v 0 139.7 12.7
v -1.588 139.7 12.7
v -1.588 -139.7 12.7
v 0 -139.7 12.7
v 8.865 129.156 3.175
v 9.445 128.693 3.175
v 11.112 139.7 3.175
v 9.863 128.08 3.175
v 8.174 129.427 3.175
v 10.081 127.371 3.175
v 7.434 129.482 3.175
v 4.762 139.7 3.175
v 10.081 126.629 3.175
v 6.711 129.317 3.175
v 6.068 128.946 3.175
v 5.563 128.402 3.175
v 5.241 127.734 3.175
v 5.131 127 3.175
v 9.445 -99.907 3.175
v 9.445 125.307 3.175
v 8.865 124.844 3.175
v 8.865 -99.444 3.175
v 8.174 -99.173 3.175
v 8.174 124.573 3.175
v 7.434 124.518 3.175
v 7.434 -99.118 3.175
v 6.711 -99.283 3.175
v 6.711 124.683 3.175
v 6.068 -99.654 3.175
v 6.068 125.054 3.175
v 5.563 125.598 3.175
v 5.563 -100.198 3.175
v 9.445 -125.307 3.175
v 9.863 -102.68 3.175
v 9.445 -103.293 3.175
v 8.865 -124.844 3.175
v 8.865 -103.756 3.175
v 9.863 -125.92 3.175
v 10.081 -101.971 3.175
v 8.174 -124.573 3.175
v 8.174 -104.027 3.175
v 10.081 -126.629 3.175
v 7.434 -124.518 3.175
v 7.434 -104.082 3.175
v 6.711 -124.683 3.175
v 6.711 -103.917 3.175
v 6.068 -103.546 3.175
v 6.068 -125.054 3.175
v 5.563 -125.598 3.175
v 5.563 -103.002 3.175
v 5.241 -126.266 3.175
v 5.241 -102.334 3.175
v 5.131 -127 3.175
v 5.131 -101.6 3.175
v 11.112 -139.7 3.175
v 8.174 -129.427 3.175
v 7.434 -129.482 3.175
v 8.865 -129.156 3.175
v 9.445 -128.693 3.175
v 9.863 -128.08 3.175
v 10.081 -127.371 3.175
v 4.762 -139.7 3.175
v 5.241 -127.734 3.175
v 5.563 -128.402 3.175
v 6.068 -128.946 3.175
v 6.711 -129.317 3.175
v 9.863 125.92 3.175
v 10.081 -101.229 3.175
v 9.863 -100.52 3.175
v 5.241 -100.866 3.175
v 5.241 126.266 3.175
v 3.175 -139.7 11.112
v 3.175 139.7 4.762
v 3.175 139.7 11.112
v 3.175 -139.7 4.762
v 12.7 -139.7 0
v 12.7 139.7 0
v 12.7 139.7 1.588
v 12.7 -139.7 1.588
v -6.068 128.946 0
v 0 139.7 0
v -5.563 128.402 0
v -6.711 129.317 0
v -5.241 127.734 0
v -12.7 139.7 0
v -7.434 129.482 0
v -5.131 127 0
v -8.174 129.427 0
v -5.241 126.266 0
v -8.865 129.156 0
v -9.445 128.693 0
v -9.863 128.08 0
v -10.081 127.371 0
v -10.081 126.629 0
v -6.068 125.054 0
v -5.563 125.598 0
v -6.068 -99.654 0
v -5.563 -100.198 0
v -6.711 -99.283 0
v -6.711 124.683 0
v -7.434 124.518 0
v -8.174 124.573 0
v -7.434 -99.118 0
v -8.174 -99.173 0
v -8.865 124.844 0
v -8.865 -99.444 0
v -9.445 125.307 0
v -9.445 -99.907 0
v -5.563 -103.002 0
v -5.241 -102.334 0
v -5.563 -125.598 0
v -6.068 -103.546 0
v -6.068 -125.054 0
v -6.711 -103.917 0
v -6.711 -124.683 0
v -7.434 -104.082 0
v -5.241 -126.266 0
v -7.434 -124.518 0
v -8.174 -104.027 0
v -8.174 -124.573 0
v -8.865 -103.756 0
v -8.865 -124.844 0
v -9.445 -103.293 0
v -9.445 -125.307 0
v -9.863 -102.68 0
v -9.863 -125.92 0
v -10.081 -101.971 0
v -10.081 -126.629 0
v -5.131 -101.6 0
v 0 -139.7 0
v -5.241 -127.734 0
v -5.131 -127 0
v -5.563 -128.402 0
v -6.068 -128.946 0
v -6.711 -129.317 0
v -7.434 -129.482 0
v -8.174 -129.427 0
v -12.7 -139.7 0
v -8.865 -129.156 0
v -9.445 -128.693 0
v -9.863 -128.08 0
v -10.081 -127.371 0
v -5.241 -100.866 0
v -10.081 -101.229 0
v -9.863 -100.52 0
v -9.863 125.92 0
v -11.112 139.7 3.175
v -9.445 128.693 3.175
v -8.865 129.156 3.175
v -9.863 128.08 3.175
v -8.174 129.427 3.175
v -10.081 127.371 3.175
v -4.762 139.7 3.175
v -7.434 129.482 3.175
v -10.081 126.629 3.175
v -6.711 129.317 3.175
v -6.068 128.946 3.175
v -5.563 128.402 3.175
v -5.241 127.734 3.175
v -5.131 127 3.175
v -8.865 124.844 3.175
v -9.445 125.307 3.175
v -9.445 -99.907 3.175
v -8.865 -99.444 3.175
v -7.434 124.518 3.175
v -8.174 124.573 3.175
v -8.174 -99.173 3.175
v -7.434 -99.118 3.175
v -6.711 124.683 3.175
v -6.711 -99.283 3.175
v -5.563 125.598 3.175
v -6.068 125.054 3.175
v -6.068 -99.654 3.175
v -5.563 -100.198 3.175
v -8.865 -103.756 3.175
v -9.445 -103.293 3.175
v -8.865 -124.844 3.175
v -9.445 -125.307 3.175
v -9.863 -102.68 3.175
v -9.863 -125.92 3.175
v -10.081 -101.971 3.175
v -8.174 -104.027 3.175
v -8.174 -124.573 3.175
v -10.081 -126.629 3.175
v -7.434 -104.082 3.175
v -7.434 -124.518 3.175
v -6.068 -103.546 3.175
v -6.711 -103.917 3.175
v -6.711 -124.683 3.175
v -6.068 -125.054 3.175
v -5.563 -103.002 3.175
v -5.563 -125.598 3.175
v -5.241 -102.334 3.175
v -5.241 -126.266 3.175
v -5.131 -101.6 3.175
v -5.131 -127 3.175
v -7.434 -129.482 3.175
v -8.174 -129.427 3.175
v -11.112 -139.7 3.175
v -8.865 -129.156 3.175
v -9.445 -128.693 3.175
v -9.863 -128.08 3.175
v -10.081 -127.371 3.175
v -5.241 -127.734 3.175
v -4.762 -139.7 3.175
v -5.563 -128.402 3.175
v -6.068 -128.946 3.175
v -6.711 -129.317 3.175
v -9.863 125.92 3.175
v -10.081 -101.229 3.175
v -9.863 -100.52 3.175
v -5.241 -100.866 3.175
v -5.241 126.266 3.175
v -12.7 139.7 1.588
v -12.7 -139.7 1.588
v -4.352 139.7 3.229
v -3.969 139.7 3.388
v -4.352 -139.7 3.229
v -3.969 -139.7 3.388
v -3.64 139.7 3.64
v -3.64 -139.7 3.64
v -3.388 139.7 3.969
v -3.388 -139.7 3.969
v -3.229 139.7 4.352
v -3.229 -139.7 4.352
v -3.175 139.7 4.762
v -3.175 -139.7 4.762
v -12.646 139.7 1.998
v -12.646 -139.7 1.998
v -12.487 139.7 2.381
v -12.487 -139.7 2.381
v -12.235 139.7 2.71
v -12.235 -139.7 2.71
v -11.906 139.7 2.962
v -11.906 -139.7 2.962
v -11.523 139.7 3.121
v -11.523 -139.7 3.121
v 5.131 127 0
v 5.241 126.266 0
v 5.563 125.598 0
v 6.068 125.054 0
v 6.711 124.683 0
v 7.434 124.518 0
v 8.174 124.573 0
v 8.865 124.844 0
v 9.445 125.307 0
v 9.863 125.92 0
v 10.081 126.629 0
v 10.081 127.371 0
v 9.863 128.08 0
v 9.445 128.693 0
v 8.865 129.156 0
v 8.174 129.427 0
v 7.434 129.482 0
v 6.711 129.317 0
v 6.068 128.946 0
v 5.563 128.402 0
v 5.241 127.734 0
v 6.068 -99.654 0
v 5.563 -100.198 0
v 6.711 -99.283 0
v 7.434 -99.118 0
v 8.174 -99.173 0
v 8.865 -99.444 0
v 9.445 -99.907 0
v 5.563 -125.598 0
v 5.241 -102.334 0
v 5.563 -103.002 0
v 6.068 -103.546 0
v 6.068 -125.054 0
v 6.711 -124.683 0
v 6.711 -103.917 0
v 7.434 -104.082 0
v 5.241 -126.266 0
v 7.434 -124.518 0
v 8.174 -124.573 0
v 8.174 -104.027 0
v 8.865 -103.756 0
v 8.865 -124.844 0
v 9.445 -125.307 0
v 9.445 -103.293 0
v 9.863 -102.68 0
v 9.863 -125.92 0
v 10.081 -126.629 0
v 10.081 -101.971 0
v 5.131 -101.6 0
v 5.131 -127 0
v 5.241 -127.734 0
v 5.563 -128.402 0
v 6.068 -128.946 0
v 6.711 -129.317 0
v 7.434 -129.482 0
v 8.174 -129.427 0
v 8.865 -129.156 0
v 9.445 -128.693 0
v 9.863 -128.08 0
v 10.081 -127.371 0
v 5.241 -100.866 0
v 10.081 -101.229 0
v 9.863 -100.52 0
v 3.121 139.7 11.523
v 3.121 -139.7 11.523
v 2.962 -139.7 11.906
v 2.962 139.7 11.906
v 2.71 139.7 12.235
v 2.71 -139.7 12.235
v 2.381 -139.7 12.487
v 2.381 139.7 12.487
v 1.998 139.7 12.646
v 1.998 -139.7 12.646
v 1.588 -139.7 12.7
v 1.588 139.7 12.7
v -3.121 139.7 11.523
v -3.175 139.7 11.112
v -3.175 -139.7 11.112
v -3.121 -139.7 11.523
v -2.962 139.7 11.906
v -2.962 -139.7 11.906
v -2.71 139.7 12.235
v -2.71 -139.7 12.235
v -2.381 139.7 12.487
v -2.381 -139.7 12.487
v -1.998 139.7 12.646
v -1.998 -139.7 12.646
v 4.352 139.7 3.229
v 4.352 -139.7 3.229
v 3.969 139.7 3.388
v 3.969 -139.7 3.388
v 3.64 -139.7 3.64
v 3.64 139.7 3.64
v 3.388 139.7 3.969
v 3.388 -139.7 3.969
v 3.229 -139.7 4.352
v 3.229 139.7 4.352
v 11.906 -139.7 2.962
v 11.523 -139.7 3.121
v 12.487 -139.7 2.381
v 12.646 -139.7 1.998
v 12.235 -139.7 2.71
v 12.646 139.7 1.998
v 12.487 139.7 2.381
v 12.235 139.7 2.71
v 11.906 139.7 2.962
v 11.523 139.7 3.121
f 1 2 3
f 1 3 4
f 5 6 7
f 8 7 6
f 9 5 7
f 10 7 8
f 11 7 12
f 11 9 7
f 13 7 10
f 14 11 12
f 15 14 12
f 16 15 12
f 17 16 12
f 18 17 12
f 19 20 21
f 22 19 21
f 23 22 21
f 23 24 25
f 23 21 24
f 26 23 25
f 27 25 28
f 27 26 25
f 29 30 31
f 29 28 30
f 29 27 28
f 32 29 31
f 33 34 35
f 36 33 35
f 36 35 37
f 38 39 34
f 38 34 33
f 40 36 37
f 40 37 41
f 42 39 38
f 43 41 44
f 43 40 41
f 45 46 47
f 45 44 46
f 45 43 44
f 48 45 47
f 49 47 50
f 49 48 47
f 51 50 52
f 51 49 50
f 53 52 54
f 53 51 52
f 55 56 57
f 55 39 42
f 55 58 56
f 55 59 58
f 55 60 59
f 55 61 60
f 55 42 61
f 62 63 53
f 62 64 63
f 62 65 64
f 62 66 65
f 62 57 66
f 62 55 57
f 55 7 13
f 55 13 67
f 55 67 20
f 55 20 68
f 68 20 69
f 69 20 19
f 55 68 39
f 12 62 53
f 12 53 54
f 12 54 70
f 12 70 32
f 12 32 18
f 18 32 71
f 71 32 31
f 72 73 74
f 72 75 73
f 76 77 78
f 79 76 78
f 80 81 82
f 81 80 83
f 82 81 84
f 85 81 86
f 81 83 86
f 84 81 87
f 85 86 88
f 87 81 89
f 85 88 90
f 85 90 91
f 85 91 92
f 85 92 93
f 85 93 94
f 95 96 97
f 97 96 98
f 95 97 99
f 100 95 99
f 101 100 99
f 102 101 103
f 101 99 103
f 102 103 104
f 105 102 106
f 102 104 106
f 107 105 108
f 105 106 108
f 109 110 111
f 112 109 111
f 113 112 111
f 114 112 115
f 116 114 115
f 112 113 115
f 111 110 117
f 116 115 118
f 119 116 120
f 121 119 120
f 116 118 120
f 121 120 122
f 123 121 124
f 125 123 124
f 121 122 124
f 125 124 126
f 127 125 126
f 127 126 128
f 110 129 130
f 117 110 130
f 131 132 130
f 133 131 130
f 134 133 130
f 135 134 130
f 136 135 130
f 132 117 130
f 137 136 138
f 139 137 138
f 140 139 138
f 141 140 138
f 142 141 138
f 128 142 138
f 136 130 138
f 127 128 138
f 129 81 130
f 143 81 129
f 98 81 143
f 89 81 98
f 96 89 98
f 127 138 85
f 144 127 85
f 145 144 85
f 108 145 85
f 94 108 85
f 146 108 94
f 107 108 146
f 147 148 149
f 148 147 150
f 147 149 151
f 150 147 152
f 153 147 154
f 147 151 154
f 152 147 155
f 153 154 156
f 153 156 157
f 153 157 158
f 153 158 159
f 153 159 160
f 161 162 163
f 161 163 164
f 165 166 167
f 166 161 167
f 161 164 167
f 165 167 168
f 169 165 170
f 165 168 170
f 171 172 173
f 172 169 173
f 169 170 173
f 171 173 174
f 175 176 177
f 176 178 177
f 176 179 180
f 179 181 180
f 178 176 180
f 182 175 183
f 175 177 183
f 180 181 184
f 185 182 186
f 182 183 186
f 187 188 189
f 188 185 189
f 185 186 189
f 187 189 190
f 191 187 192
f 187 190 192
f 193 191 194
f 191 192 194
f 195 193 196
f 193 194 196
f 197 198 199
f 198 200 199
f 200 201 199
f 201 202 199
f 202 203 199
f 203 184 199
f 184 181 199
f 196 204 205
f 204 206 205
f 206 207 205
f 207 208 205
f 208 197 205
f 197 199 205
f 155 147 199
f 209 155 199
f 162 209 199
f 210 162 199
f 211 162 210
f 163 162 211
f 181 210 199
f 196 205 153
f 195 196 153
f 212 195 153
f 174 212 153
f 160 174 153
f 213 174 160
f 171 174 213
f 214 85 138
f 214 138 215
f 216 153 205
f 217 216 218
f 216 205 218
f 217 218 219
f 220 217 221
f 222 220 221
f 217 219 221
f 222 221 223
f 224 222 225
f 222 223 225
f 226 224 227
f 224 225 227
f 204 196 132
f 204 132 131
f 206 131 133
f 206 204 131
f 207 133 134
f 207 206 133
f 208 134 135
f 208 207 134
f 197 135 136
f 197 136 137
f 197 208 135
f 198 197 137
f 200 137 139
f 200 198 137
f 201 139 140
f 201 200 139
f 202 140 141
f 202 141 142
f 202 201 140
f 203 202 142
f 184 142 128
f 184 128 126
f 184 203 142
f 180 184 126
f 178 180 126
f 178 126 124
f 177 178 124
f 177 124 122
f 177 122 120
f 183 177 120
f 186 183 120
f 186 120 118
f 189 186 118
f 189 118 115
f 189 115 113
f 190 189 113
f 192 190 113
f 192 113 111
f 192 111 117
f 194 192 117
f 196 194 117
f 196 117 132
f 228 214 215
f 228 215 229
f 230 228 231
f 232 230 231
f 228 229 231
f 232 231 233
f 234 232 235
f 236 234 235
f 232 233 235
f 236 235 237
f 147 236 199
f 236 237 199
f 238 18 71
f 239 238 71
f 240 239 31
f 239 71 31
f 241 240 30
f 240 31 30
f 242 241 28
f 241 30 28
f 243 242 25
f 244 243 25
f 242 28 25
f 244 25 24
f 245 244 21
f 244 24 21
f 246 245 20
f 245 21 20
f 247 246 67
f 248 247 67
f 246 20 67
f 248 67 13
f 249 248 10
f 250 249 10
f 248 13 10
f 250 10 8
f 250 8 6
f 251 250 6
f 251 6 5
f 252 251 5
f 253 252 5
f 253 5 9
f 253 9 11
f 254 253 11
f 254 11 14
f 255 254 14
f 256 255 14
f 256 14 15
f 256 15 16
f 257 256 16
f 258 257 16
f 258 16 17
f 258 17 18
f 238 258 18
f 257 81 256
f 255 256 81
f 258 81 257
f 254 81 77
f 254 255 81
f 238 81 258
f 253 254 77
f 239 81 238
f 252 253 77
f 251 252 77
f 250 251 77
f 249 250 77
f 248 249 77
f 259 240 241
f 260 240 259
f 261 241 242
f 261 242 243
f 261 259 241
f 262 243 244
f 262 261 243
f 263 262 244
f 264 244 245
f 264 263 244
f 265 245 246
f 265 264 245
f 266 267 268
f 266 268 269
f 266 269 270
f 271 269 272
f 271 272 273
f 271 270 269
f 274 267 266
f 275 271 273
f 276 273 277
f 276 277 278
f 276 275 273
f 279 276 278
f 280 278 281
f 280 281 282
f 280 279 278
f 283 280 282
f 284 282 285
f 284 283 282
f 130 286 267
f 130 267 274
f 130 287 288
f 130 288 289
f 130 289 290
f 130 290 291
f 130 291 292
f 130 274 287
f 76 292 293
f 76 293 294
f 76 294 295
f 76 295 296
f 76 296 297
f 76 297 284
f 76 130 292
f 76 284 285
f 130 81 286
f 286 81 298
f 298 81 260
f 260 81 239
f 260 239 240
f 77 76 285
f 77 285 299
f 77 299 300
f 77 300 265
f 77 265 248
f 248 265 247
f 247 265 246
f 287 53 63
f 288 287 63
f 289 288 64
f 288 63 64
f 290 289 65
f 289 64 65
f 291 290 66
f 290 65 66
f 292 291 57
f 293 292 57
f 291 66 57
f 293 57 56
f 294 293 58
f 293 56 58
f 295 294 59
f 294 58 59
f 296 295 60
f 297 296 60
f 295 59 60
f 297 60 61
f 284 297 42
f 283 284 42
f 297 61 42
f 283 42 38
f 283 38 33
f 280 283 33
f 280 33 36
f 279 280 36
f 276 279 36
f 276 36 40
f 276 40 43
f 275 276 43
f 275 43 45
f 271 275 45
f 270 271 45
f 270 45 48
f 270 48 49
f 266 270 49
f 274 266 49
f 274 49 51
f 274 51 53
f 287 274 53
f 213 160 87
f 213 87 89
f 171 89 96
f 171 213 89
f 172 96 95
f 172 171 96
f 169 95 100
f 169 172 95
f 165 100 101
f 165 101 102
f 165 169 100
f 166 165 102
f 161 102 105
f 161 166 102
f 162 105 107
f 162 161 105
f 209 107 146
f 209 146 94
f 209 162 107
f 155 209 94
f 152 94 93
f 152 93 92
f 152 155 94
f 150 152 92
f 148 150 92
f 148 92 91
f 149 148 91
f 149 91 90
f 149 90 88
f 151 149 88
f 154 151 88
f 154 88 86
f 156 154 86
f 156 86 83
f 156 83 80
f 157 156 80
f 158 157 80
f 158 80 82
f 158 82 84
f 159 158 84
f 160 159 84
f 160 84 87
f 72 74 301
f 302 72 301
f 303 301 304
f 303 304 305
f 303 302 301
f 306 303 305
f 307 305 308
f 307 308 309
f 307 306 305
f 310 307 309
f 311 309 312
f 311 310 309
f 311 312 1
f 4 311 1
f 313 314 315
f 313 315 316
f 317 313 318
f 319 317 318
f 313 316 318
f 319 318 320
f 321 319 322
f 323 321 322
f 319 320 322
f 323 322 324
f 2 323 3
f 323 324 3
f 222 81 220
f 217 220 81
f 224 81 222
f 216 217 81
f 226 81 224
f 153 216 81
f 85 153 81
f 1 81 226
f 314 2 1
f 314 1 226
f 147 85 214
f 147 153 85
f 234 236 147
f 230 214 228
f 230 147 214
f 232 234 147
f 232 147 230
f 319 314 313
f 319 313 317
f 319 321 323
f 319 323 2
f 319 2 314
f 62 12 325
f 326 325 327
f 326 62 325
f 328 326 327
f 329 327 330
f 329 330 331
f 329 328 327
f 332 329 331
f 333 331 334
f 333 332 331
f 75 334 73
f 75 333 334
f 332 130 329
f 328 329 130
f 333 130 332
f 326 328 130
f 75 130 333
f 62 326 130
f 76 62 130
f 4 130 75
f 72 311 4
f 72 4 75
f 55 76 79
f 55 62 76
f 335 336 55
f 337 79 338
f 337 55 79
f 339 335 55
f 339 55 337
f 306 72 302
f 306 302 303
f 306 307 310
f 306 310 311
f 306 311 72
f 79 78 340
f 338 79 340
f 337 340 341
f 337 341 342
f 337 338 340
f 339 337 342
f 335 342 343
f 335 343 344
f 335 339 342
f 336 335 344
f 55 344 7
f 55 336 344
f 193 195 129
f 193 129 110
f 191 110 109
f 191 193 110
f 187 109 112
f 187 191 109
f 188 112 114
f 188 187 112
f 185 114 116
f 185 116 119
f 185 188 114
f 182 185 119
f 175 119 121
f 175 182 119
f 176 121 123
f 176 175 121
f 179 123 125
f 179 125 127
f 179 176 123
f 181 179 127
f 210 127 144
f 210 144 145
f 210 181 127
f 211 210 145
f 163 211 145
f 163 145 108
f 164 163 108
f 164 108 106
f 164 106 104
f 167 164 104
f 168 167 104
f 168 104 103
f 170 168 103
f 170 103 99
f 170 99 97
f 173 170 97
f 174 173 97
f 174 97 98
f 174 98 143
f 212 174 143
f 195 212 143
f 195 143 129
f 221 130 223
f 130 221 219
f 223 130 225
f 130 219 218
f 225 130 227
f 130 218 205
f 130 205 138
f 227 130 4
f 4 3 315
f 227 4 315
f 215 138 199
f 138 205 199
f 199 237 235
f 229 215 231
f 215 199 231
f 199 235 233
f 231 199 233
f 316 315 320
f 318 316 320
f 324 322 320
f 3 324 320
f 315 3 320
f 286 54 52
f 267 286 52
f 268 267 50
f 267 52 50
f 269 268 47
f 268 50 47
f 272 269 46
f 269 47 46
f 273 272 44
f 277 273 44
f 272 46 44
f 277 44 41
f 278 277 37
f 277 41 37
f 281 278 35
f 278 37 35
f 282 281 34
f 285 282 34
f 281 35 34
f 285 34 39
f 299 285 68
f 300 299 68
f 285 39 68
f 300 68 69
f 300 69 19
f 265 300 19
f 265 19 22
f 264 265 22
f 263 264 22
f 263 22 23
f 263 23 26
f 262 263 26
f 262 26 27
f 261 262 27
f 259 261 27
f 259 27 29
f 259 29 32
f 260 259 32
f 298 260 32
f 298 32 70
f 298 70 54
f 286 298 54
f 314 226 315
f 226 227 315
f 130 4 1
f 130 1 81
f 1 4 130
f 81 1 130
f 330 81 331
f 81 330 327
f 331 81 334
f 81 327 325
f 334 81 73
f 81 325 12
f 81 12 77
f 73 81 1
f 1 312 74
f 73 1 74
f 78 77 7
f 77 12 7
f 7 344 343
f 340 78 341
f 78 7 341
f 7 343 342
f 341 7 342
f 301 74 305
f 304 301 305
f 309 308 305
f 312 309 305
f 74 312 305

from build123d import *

# Parameters (mm, degrees)
F1_DEPTH = 139.7
F3_D     = 4.9784


with BuildPart() as f1:
    # F0 (on Front) → F1 (new body, symmetric)
    with BuildSketch(Plane.XZ):
        with BuildLine():
            Line((1.5875, 12.7), (0, 12.7))
            Line((0, 12.7), (0, 0))
            Line((0, 0), (12.7, 0))
            Line((12.7, 0), (12.7, 1.5875))
            ThreePointArc((12.7, 1.5875), (12.2350320151, 2.7100320151), (11.1125, 3.175))
            Line((11.1125, 3.175), (4.7625, 3.175))
            ThreePointArc((4.7625, 3.175), (3.6399679849, 3.6399679849), (3.175, 4.7625))
            Line((3.175, 4.7625), (3.175, 11.1125))
            ThreePointArc((3.175, 11.1125), (2.7100320151, 12.2350320151), (1.5875, 12.7))
        make_face()
    extrude(amount=F1_DEPTH, both=True)

    # F3 (through all)
    with Locations(Plane(origin=(0, 0, 0), x_dir=(1, 0, 0), z_dir=(0, 0, -1))):
        with Locations((7.62, -127), (7.62, 101.6), (7.62, 127)):
            Hole(F3_D / 2)


with BuildPart() as f4_1:
    # F4: instance of F1
    add(f1.part.mirror(Plane.YZ))


solid = Compound([f1.part, f4_1.part])
